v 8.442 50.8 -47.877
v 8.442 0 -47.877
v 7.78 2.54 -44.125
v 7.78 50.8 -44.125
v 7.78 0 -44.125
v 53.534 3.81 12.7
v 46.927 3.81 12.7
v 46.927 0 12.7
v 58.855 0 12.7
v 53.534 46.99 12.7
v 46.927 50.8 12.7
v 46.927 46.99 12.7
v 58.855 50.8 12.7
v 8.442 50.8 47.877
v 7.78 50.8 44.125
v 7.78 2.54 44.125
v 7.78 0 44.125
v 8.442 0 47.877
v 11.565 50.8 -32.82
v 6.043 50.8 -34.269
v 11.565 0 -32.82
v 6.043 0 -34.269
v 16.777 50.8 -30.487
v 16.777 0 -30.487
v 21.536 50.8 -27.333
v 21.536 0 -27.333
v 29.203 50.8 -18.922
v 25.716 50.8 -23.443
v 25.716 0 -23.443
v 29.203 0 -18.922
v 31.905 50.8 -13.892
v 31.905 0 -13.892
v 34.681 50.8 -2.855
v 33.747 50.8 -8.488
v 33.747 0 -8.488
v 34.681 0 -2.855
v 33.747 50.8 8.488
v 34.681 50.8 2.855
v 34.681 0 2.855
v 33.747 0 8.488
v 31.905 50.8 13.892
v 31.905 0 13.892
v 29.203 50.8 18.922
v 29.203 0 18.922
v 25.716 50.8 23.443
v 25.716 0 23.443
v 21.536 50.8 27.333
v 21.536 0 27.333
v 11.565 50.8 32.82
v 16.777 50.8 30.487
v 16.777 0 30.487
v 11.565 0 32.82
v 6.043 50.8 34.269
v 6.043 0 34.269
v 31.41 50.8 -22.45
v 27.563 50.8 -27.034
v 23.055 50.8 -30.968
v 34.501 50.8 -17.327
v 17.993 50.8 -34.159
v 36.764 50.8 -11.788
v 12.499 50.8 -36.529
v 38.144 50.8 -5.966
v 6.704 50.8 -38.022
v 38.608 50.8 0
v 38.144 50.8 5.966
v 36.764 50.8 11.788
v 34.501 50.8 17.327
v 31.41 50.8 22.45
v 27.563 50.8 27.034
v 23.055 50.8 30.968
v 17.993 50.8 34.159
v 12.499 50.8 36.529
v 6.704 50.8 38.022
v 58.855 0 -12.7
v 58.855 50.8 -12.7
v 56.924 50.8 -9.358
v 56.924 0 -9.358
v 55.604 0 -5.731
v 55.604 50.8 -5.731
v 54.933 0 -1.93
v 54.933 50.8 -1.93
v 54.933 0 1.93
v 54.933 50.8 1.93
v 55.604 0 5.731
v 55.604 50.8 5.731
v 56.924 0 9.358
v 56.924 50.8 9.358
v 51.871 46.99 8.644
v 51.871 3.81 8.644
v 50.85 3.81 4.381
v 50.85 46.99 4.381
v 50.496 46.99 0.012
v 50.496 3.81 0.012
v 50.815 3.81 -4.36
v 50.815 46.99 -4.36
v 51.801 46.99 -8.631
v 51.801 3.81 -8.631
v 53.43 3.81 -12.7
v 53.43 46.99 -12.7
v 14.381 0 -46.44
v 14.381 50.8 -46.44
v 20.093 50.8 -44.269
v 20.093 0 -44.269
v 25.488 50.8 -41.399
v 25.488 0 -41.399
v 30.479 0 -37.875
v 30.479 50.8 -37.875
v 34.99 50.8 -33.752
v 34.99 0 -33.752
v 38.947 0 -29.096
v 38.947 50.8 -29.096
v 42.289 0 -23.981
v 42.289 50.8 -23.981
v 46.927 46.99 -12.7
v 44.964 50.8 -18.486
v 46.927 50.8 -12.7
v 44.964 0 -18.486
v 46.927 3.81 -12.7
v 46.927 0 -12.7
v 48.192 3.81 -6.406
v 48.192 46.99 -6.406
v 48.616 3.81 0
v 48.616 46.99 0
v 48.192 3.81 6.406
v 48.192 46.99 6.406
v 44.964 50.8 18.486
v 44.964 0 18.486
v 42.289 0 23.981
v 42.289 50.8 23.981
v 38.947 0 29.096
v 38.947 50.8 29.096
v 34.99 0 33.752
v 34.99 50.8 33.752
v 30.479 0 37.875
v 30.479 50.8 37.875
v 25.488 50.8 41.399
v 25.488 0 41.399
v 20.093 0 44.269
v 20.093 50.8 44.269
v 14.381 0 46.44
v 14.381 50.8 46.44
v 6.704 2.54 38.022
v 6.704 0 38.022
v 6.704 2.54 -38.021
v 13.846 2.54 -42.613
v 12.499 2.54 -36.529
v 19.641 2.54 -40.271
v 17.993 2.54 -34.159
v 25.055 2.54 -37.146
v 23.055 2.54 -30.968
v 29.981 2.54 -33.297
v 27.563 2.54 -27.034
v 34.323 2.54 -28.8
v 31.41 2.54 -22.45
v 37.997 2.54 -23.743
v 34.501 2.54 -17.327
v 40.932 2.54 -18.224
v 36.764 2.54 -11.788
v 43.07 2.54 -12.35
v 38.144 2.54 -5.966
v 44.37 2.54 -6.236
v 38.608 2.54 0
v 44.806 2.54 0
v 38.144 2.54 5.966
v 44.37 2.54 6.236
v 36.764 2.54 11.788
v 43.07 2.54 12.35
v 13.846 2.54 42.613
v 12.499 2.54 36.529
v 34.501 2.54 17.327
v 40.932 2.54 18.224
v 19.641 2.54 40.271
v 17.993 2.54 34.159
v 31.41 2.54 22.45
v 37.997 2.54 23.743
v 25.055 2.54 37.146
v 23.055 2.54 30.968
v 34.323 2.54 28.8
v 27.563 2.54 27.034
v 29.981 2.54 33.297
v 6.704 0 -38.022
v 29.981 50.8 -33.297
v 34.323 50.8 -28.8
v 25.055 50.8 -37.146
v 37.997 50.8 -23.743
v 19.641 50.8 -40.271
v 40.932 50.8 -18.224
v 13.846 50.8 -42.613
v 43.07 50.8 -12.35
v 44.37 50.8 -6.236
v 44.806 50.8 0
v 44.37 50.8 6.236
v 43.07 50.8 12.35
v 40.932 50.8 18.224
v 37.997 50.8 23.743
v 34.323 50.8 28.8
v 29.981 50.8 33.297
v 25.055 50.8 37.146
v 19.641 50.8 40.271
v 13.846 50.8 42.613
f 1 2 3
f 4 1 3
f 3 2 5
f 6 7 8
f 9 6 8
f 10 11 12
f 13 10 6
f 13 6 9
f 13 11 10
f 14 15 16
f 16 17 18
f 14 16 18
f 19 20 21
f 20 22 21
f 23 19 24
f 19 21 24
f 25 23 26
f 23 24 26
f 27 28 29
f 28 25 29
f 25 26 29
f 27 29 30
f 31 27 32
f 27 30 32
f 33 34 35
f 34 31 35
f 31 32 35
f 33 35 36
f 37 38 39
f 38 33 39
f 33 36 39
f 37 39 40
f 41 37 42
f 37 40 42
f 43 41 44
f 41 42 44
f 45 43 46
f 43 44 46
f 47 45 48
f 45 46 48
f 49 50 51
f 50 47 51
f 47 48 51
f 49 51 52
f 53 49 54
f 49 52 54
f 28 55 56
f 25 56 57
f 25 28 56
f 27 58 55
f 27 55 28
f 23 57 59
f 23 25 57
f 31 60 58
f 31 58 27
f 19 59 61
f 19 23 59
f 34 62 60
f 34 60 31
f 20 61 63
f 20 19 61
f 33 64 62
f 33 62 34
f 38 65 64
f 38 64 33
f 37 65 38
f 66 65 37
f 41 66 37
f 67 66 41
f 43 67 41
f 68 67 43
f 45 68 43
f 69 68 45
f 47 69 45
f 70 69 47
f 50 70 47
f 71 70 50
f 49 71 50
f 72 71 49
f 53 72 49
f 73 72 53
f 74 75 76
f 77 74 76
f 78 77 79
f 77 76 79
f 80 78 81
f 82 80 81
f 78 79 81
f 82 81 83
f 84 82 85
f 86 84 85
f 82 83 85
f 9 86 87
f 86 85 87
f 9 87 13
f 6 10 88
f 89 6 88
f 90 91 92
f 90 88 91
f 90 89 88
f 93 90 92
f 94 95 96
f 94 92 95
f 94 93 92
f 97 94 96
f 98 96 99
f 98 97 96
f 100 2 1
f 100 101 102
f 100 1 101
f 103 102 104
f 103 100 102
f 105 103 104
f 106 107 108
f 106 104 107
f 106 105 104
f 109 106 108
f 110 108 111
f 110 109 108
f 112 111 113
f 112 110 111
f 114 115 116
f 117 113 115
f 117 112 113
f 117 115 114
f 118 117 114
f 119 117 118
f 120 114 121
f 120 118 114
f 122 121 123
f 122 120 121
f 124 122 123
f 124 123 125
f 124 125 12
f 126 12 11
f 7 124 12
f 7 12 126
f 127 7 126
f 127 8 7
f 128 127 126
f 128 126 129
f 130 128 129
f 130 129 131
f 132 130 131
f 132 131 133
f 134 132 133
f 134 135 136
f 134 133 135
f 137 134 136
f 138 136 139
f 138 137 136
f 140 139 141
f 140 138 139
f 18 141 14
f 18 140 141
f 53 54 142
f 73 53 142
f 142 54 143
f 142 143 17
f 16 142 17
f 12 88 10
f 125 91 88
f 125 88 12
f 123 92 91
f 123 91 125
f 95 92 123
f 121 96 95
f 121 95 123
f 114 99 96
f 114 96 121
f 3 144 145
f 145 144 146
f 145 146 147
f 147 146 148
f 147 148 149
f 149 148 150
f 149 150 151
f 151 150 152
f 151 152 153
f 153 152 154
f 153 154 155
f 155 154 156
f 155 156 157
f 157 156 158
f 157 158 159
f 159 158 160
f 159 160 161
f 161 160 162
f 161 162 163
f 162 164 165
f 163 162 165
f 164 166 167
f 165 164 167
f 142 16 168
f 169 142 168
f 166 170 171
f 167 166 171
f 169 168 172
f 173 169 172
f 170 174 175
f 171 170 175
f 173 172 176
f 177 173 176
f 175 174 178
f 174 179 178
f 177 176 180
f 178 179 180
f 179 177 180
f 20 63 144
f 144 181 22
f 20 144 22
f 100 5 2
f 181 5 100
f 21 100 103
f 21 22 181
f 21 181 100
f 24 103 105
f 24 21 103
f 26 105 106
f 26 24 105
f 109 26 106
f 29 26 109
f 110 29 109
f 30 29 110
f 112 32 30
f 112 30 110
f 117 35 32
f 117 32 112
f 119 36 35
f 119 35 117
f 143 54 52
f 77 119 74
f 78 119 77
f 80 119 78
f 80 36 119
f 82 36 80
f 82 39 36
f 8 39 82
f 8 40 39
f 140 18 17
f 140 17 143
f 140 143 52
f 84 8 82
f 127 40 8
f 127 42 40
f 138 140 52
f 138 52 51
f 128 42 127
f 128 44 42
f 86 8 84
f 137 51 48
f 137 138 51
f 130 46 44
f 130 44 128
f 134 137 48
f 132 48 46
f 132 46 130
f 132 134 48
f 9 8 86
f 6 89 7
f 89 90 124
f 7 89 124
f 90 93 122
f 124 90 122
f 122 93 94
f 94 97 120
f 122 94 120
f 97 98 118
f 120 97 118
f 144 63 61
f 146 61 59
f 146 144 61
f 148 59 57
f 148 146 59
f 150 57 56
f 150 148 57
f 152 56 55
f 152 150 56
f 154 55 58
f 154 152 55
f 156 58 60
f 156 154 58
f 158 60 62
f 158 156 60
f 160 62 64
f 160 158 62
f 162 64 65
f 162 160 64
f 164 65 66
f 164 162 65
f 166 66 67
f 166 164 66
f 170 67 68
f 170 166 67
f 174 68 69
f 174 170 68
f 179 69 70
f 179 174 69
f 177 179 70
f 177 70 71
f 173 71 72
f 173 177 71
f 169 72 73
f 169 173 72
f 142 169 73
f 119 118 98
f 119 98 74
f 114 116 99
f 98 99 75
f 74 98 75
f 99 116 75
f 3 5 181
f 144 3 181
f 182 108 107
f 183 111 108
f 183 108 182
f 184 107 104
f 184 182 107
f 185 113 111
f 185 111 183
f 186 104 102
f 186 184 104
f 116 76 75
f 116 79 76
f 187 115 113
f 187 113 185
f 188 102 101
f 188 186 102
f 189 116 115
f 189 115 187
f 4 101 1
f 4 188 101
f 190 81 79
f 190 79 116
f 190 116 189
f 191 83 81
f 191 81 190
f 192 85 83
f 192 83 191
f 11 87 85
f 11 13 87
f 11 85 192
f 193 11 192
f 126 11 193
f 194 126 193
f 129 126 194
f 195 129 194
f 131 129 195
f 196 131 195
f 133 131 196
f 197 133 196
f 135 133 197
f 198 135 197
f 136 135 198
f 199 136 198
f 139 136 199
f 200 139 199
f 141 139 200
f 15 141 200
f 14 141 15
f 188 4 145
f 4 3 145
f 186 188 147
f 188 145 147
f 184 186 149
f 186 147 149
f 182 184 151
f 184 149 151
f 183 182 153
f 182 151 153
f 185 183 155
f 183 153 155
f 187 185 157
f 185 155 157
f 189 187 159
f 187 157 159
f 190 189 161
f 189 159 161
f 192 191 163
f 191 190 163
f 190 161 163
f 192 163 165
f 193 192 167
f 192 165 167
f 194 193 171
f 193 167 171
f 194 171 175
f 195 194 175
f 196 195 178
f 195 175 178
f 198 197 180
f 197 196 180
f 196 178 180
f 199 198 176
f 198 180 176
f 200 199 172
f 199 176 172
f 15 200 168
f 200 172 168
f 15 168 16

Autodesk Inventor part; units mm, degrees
ref_plane "YZ Plane" through (0, 0, 0) normal (1, 0, 0) x (0, 1, 0)
ref_plane "XZ Plane" through (0, 0, 0) normal (0, 1, 0) x (-1, 0, 0)
ref_plane "XY Plane" through (0, 0, 0) normal (0, 0, 1) x (1, 0, 0)
sketch "Sketch1" plane through (0, 0, 0) normal (0, 1, 0) x (-1, 0, 0)
  arc A0 (-8.442, 47.877) -> (-8.442, -47.877) centre (0, 0) ccw
  arc A1 (-7.7804, 44.1249) -> (-7.7804, -44.1249) centre (0, 0) ccw
  arc A2 (-6.7042, 38.0215) -> (-6.7042, -38.0215) centre (0, 0) ccw
  arc A3 (-6.0426, 34.2693) -> (-6.0426, -34.2693) centre (0, 0) ccw
  line L0 (0, 0) -> (57.6746, 0) construction
  line L1 (-10.0151, -56.7984) -> (0, 0)
  line L2 (0, 0) -> (-10.8029, 61.2664)
  line L3 (0, 0) -> (62.2115, 0) construction
  dimension "d0" = 97.2312
  dimension "d1" = 89.6112
  dimension "d14" = 77.216
  dimension "d15" = 69.596
  dimension "d17" = 100
  dimension "d18" = 100
extrude "Extrusion1" add sketch "Sketch1" along normal blind 50.8 contours L2 A1 L1 A0 | L2 A3 L1 A2
sketch "Sketch2" plane through (0, 0, 0) normal (0, 0, 1) x (1, 0, 0)
  line L0 (0, 0) -> (58.8549, 0)
  line L1 (58.8549, 0) -> (58.8549, 25.4)
  line L2 (0, 25.4) -> (0, 0)
  line L3 (50.4953, 3.81) -> (3.81, 3.81)
  line L4 (3.81, 3.81) -> (3.81, 21.59)
  line L5 (3.81, 21.59) -> (45.975, 21.59)
  line L6 (45.975, 21.59) -> (45.975, 3.81)
  line L7 (45.975, 21.59) -> (45.975, 25.4)
  line L8 (45.975, 3.81) -> (45.975, 0)
  line L9 (50.4953, 21.59) -> (50.4953, 3.81)
  line L10 (0, 50.8) -> (58.8549, 50.8)
  line L11 (58.8549, 50.8) -> (58.8549, 25.4)
  line L12 (50.4953, 46.99) -> (3.81, 46.99)
  line L13 (3.81, 29.21) -> (45.975, 29.21)
  line L14 (45.975, 29.21) -> (45.975, 46.99)
  line L15 (45.975, 29.21) -> (45.975, 25.4)
  line L16 (45.975, 46.99) -> (45.975, 50.8)
  line L17 (50.4953, 29.21) -> (50.4953, 46.99)
  line L18 (50.4953, 29.21) -> (50.4953, 21.59)
  line L19 (45.975, 25.4) -> (0, 25.4)
extrude "Extrusion2" add sketch "Sketch2" along normal mid plane 25.4 contours L8 L3 L9 L18 L17 L12 L16 L10 L11 L1 L0
sketch "Sketch3" plane through (0, 0, 0) normal (0, -1, 0) x (1, 0, 0)
  circle A0 centre (0, 0) radius 44.8056
  circle A1 centre (0, 0) radius 38.608
  line L0 (7.7804, -44.1249) -> (6.0426, -34.2693)
  line L1 (6.0426, 34.2693) -> (6.7042, 38.0215) projected
  line L2 (6.7042, 38.0215) -> (7.7804, 44.1249)
  point P0 (6.7042, -38.0215)
  dimension "d7" = 77.216
extrude "Extrusion3" add sketch "Sketch3" against normal blind 2.54 contours A0 L0 A1 L2 picked at (42.4436, 2.9594)
sketch "Sketch4" plane through (0, 50.8, 0) normal (0, 1, 0) x (1, 0, 0)
  line L0 (58.8549, -12.7) -> (58.8549, 12.7)
  arc A0 (58.8549, 12.7) -> (58.8549, -12.7) centre (76.984, 0) ccw
  point P0 (0, 0)
sketch "Sketch5" plane through (46.9275, 3.81, 12.7) normal (0, 1, 0) x (1, 0, 0)
  arc A0 (6.5029, 25.4) -> (6.6061, 0) centre (32.0653, 12.8036) ccw
  line L0 (6.5029, 25.4) -> (1.7839, 25.4)
  line L1 (0, 25.4) -> (3.5678, 25.4) projected
  line L2 (1.7839, 25.4) -> (2.3688, 0)
  line L3 (3.5678, 0) -> (0, 0) projected
  line L4 (6.6061, 0) -> (2.3688, 0)
  point P0 (-46.9275, 12.7)
  point P1 (6.5578, 0.0965)
extrude "Extrusion4" cut sketch "Sketch5" along normal up to surface (43.18 mm away)
extrude "Extrusion5" cut sketch "Sketch4" against normal up to surface (50.8 mm away)
properties part number "Mount"
